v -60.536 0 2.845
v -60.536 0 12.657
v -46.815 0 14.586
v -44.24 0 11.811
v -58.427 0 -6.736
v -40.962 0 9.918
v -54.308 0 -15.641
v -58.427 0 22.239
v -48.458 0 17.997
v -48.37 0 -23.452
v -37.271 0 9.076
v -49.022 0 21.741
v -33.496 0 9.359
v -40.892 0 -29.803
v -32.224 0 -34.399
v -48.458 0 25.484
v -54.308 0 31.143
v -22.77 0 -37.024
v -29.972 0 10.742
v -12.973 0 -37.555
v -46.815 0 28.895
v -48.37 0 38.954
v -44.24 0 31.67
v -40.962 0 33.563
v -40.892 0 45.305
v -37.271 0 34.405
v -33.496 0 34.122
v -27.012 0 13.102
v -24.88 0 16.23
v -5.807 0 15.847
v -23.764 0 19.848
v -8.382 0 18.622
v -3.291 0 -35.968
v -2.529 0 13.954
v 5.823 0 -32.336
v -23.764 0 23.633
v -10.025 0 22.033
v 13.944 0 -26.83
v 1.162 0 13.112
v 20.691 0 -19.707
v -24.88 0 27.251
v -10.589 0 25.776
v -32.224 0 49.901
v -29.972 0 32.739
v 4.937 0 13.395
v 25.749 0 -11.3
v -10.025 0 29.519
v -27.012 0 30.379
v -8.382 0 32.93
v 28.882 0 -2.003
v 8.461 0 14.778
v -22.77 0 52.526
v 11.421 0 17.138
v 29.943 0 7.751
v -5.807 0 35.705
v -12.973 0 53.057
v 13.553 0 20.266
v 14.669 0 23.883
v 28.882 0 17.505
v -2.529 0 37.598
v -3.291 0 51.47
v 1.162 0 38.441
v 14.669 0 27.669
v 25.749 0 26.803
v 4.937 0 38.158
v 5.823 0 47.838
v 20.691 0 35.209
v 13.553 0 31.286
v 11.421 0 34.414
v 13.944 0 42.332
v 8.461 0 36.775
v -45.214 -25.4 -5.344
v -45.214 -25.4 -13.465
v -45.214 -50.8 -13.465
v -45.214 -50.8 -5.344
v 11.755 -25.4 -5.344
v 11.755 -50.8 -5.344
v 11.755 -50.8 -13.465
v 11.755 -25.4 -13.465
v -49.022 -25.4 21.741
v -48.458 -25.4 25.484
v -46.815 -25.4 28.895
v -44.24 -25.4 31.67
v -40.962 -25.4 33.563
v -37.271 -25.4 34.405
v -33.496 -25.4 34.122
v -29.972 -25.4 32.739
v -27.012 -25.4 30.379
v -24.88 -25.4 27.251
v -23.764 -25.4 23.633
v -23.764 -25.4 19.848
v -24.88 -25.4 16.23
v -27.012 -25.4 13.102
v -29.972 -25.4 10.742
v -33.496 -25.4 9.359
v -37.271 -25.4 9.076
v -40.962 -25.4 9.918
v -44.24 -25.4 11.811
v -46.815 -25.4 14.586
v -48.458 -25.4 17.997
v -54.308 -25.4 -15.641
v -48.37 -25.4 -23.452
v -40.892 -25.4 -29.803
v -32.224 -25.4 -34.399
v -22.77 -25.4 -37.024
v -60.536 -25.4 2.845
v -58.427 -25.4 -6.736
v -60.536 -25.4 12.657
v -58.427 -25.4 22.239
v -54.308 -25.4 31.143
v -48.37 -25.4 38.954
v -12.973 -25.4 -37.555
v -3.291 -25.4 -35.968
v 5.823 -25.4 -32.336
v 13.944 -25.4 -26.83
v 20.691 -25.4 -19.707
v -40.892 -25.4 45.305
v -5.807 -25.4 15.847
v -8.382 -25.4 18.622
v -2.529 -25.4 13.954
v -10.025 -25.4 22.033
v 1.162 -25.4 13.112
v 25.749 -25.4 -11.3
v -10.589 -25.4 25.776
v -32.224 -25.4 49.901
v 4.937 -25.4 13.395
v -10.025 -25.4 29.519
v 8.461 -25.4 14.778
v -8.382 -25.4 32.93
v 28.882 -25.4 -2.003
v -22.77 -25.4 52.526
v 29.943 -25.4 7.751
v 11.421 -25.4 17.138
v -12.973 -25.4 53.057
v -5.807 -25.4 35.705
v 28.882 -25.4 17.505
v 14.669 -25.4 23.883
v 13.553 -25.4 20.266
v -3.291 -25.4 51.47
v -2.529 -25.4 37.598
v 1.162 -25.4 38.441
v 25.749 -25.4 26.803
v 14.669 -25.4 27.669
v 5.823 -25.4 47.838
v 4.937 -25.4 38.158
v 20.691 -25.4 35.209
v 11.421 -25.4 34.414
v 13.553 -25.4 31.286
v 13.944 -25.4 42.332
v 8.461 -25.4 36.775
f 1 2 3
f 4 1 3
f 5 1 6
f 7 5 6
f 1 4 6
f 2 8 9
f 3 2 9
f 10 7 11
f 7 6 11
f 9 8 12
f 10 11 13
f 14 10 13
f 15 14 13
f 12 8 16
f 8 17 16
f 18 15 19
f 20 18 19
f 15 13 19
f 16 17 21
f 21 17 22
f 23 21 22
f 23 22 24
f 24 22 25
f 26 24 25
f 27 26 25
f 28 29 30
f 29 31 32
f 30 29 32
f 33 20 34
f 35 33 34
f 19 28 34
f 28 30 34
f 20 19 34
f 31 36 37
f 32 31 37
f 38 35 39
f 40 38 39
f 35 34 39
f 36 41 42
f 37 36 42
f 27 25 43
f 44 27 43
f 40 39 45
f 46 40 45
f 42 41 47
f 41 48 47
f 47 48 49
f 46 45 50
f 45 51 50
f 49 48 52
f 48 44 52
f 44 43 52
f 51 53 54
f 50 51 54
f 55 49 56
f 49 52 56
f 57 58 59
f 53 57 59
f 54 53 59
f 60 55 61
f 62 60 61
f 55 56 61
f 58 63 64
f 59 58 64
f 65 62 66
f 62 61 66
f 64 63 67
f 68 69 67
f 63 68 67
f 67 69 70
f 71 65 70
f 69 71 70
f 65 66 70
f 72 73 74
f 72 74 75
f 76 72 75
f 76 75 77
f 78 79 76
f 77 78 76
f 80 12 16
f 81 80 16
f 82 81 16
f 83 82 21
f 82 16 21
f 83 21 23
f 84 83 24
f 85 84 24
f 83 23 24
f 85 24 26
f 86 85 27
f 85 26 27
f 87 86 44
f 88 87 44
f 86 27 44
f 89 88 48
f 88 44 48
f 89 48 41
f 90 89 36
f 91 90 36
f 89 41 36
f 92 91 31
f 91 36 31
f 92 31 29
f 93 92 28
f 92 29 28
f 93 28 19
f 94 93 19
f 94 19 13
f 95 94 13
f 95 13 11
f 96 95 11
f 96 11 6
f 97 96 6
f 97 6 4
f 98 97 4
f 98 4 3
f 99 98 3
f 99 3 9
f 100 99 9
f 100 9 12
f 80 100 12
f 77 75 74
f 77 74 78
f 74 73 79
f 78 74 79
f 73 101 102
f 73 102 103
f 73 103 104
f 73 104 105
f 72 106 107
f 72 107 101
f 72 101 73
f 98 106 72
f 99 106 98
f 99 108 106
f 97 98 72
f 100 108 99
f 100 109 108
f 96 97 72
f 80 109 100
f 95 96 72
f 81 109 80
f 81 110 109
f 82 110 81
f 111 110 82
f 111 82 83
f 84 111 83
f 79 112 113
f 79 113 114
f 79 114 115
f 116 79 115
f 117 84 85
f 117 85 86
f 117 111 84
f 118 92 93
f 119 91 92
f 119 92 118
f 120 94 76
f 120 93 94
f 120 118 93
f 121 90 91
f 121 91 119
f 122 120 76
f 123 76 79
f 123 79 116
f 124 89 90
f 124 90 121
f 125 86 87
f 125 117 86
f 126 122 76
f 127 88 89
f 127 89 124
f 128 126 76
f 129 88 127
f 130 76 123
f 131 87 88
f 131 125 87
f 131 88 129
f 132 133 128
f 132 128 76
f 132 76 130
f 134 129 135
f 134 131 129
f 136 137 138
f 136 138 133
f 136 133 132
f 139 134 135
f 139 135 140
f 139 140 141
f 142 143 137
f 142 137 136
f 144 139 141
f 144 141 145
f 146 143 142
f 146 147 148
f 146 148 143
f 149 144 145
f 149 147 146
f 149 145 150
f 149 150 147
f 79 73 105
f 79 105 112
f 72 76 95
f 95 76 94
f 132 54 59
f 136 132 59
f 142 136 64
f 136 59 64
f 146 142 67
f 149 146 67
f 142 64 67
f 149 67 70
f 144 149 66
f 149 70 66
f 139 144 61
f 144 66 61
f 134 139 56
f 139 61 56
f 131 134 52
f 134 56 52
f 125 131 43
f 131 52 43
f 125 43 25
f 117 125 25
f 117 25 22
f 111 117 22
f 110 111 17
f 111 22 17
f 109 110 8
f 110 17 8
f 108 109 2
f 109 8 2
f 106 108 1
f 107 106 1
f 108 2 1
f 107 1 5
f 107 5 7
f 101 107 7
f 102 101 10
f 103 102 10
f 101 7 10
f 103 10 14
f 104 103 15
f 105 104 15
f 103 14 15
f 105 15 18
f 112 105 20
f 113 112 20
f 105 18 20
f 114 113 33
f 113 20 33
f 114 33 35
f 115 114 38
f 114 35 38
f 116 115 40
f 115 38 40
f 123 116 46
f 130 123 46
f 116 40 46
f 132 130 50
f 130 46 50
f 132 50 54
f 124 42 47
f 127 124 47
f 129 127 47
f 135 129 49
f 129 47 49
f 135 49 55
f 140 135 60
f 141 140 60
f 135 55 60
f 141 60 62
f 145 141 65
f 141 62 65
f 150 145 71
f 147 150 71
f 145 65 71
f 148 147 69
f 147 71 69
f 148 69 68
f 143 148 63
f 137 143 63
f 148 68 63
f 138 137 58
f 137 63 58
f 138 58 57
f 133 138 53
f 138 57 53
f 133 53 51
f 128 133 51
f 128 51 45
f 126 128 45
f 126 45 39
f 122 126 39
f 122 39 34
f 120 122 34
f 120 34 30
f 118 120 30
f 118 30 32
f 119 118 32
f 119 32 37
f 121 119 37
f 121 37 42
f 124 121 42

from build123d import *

# Parameters (mm, degrees)
F0_R     = 45.372538
F1_DEPTH = 25.4
F3_D     = 25.4
F5_D     = 25.4
F6_W     = 56.968233
F6_H     = 8.121184
F7_DEPTH = 25.4


with BuildPart() as f1:
    # F0 (on Front) → F1 (new body)
    with BuildSketch(Plane.XZ):
        with Locations((-15.429733, 7.751094)):
            Circle(F0_R)
    extrude(amount=F1_DEPTH)

    # F3 (through all)
    with Locations(Plane.XZ.offset(25.4)):
        with Locations((-36.322083, 21.740559)):
            Hole(F3_D / 2)

    # F5 (through all)
    with Locations(Plane.XZ.offset(25.4)):
        with Locations((2.110902, 25.776088)):
            Hole(F5_D / 2)

    # F6 (on face) → F7 (join)
    with BuildSketch(Plane.XZ.offset(25.4)):
        with Locations((-16.729575, -9.404827)):
            Rectangle(F6_W, F6_H)
    extrude(amount=F7_DEPTH)


solid = f1.part
